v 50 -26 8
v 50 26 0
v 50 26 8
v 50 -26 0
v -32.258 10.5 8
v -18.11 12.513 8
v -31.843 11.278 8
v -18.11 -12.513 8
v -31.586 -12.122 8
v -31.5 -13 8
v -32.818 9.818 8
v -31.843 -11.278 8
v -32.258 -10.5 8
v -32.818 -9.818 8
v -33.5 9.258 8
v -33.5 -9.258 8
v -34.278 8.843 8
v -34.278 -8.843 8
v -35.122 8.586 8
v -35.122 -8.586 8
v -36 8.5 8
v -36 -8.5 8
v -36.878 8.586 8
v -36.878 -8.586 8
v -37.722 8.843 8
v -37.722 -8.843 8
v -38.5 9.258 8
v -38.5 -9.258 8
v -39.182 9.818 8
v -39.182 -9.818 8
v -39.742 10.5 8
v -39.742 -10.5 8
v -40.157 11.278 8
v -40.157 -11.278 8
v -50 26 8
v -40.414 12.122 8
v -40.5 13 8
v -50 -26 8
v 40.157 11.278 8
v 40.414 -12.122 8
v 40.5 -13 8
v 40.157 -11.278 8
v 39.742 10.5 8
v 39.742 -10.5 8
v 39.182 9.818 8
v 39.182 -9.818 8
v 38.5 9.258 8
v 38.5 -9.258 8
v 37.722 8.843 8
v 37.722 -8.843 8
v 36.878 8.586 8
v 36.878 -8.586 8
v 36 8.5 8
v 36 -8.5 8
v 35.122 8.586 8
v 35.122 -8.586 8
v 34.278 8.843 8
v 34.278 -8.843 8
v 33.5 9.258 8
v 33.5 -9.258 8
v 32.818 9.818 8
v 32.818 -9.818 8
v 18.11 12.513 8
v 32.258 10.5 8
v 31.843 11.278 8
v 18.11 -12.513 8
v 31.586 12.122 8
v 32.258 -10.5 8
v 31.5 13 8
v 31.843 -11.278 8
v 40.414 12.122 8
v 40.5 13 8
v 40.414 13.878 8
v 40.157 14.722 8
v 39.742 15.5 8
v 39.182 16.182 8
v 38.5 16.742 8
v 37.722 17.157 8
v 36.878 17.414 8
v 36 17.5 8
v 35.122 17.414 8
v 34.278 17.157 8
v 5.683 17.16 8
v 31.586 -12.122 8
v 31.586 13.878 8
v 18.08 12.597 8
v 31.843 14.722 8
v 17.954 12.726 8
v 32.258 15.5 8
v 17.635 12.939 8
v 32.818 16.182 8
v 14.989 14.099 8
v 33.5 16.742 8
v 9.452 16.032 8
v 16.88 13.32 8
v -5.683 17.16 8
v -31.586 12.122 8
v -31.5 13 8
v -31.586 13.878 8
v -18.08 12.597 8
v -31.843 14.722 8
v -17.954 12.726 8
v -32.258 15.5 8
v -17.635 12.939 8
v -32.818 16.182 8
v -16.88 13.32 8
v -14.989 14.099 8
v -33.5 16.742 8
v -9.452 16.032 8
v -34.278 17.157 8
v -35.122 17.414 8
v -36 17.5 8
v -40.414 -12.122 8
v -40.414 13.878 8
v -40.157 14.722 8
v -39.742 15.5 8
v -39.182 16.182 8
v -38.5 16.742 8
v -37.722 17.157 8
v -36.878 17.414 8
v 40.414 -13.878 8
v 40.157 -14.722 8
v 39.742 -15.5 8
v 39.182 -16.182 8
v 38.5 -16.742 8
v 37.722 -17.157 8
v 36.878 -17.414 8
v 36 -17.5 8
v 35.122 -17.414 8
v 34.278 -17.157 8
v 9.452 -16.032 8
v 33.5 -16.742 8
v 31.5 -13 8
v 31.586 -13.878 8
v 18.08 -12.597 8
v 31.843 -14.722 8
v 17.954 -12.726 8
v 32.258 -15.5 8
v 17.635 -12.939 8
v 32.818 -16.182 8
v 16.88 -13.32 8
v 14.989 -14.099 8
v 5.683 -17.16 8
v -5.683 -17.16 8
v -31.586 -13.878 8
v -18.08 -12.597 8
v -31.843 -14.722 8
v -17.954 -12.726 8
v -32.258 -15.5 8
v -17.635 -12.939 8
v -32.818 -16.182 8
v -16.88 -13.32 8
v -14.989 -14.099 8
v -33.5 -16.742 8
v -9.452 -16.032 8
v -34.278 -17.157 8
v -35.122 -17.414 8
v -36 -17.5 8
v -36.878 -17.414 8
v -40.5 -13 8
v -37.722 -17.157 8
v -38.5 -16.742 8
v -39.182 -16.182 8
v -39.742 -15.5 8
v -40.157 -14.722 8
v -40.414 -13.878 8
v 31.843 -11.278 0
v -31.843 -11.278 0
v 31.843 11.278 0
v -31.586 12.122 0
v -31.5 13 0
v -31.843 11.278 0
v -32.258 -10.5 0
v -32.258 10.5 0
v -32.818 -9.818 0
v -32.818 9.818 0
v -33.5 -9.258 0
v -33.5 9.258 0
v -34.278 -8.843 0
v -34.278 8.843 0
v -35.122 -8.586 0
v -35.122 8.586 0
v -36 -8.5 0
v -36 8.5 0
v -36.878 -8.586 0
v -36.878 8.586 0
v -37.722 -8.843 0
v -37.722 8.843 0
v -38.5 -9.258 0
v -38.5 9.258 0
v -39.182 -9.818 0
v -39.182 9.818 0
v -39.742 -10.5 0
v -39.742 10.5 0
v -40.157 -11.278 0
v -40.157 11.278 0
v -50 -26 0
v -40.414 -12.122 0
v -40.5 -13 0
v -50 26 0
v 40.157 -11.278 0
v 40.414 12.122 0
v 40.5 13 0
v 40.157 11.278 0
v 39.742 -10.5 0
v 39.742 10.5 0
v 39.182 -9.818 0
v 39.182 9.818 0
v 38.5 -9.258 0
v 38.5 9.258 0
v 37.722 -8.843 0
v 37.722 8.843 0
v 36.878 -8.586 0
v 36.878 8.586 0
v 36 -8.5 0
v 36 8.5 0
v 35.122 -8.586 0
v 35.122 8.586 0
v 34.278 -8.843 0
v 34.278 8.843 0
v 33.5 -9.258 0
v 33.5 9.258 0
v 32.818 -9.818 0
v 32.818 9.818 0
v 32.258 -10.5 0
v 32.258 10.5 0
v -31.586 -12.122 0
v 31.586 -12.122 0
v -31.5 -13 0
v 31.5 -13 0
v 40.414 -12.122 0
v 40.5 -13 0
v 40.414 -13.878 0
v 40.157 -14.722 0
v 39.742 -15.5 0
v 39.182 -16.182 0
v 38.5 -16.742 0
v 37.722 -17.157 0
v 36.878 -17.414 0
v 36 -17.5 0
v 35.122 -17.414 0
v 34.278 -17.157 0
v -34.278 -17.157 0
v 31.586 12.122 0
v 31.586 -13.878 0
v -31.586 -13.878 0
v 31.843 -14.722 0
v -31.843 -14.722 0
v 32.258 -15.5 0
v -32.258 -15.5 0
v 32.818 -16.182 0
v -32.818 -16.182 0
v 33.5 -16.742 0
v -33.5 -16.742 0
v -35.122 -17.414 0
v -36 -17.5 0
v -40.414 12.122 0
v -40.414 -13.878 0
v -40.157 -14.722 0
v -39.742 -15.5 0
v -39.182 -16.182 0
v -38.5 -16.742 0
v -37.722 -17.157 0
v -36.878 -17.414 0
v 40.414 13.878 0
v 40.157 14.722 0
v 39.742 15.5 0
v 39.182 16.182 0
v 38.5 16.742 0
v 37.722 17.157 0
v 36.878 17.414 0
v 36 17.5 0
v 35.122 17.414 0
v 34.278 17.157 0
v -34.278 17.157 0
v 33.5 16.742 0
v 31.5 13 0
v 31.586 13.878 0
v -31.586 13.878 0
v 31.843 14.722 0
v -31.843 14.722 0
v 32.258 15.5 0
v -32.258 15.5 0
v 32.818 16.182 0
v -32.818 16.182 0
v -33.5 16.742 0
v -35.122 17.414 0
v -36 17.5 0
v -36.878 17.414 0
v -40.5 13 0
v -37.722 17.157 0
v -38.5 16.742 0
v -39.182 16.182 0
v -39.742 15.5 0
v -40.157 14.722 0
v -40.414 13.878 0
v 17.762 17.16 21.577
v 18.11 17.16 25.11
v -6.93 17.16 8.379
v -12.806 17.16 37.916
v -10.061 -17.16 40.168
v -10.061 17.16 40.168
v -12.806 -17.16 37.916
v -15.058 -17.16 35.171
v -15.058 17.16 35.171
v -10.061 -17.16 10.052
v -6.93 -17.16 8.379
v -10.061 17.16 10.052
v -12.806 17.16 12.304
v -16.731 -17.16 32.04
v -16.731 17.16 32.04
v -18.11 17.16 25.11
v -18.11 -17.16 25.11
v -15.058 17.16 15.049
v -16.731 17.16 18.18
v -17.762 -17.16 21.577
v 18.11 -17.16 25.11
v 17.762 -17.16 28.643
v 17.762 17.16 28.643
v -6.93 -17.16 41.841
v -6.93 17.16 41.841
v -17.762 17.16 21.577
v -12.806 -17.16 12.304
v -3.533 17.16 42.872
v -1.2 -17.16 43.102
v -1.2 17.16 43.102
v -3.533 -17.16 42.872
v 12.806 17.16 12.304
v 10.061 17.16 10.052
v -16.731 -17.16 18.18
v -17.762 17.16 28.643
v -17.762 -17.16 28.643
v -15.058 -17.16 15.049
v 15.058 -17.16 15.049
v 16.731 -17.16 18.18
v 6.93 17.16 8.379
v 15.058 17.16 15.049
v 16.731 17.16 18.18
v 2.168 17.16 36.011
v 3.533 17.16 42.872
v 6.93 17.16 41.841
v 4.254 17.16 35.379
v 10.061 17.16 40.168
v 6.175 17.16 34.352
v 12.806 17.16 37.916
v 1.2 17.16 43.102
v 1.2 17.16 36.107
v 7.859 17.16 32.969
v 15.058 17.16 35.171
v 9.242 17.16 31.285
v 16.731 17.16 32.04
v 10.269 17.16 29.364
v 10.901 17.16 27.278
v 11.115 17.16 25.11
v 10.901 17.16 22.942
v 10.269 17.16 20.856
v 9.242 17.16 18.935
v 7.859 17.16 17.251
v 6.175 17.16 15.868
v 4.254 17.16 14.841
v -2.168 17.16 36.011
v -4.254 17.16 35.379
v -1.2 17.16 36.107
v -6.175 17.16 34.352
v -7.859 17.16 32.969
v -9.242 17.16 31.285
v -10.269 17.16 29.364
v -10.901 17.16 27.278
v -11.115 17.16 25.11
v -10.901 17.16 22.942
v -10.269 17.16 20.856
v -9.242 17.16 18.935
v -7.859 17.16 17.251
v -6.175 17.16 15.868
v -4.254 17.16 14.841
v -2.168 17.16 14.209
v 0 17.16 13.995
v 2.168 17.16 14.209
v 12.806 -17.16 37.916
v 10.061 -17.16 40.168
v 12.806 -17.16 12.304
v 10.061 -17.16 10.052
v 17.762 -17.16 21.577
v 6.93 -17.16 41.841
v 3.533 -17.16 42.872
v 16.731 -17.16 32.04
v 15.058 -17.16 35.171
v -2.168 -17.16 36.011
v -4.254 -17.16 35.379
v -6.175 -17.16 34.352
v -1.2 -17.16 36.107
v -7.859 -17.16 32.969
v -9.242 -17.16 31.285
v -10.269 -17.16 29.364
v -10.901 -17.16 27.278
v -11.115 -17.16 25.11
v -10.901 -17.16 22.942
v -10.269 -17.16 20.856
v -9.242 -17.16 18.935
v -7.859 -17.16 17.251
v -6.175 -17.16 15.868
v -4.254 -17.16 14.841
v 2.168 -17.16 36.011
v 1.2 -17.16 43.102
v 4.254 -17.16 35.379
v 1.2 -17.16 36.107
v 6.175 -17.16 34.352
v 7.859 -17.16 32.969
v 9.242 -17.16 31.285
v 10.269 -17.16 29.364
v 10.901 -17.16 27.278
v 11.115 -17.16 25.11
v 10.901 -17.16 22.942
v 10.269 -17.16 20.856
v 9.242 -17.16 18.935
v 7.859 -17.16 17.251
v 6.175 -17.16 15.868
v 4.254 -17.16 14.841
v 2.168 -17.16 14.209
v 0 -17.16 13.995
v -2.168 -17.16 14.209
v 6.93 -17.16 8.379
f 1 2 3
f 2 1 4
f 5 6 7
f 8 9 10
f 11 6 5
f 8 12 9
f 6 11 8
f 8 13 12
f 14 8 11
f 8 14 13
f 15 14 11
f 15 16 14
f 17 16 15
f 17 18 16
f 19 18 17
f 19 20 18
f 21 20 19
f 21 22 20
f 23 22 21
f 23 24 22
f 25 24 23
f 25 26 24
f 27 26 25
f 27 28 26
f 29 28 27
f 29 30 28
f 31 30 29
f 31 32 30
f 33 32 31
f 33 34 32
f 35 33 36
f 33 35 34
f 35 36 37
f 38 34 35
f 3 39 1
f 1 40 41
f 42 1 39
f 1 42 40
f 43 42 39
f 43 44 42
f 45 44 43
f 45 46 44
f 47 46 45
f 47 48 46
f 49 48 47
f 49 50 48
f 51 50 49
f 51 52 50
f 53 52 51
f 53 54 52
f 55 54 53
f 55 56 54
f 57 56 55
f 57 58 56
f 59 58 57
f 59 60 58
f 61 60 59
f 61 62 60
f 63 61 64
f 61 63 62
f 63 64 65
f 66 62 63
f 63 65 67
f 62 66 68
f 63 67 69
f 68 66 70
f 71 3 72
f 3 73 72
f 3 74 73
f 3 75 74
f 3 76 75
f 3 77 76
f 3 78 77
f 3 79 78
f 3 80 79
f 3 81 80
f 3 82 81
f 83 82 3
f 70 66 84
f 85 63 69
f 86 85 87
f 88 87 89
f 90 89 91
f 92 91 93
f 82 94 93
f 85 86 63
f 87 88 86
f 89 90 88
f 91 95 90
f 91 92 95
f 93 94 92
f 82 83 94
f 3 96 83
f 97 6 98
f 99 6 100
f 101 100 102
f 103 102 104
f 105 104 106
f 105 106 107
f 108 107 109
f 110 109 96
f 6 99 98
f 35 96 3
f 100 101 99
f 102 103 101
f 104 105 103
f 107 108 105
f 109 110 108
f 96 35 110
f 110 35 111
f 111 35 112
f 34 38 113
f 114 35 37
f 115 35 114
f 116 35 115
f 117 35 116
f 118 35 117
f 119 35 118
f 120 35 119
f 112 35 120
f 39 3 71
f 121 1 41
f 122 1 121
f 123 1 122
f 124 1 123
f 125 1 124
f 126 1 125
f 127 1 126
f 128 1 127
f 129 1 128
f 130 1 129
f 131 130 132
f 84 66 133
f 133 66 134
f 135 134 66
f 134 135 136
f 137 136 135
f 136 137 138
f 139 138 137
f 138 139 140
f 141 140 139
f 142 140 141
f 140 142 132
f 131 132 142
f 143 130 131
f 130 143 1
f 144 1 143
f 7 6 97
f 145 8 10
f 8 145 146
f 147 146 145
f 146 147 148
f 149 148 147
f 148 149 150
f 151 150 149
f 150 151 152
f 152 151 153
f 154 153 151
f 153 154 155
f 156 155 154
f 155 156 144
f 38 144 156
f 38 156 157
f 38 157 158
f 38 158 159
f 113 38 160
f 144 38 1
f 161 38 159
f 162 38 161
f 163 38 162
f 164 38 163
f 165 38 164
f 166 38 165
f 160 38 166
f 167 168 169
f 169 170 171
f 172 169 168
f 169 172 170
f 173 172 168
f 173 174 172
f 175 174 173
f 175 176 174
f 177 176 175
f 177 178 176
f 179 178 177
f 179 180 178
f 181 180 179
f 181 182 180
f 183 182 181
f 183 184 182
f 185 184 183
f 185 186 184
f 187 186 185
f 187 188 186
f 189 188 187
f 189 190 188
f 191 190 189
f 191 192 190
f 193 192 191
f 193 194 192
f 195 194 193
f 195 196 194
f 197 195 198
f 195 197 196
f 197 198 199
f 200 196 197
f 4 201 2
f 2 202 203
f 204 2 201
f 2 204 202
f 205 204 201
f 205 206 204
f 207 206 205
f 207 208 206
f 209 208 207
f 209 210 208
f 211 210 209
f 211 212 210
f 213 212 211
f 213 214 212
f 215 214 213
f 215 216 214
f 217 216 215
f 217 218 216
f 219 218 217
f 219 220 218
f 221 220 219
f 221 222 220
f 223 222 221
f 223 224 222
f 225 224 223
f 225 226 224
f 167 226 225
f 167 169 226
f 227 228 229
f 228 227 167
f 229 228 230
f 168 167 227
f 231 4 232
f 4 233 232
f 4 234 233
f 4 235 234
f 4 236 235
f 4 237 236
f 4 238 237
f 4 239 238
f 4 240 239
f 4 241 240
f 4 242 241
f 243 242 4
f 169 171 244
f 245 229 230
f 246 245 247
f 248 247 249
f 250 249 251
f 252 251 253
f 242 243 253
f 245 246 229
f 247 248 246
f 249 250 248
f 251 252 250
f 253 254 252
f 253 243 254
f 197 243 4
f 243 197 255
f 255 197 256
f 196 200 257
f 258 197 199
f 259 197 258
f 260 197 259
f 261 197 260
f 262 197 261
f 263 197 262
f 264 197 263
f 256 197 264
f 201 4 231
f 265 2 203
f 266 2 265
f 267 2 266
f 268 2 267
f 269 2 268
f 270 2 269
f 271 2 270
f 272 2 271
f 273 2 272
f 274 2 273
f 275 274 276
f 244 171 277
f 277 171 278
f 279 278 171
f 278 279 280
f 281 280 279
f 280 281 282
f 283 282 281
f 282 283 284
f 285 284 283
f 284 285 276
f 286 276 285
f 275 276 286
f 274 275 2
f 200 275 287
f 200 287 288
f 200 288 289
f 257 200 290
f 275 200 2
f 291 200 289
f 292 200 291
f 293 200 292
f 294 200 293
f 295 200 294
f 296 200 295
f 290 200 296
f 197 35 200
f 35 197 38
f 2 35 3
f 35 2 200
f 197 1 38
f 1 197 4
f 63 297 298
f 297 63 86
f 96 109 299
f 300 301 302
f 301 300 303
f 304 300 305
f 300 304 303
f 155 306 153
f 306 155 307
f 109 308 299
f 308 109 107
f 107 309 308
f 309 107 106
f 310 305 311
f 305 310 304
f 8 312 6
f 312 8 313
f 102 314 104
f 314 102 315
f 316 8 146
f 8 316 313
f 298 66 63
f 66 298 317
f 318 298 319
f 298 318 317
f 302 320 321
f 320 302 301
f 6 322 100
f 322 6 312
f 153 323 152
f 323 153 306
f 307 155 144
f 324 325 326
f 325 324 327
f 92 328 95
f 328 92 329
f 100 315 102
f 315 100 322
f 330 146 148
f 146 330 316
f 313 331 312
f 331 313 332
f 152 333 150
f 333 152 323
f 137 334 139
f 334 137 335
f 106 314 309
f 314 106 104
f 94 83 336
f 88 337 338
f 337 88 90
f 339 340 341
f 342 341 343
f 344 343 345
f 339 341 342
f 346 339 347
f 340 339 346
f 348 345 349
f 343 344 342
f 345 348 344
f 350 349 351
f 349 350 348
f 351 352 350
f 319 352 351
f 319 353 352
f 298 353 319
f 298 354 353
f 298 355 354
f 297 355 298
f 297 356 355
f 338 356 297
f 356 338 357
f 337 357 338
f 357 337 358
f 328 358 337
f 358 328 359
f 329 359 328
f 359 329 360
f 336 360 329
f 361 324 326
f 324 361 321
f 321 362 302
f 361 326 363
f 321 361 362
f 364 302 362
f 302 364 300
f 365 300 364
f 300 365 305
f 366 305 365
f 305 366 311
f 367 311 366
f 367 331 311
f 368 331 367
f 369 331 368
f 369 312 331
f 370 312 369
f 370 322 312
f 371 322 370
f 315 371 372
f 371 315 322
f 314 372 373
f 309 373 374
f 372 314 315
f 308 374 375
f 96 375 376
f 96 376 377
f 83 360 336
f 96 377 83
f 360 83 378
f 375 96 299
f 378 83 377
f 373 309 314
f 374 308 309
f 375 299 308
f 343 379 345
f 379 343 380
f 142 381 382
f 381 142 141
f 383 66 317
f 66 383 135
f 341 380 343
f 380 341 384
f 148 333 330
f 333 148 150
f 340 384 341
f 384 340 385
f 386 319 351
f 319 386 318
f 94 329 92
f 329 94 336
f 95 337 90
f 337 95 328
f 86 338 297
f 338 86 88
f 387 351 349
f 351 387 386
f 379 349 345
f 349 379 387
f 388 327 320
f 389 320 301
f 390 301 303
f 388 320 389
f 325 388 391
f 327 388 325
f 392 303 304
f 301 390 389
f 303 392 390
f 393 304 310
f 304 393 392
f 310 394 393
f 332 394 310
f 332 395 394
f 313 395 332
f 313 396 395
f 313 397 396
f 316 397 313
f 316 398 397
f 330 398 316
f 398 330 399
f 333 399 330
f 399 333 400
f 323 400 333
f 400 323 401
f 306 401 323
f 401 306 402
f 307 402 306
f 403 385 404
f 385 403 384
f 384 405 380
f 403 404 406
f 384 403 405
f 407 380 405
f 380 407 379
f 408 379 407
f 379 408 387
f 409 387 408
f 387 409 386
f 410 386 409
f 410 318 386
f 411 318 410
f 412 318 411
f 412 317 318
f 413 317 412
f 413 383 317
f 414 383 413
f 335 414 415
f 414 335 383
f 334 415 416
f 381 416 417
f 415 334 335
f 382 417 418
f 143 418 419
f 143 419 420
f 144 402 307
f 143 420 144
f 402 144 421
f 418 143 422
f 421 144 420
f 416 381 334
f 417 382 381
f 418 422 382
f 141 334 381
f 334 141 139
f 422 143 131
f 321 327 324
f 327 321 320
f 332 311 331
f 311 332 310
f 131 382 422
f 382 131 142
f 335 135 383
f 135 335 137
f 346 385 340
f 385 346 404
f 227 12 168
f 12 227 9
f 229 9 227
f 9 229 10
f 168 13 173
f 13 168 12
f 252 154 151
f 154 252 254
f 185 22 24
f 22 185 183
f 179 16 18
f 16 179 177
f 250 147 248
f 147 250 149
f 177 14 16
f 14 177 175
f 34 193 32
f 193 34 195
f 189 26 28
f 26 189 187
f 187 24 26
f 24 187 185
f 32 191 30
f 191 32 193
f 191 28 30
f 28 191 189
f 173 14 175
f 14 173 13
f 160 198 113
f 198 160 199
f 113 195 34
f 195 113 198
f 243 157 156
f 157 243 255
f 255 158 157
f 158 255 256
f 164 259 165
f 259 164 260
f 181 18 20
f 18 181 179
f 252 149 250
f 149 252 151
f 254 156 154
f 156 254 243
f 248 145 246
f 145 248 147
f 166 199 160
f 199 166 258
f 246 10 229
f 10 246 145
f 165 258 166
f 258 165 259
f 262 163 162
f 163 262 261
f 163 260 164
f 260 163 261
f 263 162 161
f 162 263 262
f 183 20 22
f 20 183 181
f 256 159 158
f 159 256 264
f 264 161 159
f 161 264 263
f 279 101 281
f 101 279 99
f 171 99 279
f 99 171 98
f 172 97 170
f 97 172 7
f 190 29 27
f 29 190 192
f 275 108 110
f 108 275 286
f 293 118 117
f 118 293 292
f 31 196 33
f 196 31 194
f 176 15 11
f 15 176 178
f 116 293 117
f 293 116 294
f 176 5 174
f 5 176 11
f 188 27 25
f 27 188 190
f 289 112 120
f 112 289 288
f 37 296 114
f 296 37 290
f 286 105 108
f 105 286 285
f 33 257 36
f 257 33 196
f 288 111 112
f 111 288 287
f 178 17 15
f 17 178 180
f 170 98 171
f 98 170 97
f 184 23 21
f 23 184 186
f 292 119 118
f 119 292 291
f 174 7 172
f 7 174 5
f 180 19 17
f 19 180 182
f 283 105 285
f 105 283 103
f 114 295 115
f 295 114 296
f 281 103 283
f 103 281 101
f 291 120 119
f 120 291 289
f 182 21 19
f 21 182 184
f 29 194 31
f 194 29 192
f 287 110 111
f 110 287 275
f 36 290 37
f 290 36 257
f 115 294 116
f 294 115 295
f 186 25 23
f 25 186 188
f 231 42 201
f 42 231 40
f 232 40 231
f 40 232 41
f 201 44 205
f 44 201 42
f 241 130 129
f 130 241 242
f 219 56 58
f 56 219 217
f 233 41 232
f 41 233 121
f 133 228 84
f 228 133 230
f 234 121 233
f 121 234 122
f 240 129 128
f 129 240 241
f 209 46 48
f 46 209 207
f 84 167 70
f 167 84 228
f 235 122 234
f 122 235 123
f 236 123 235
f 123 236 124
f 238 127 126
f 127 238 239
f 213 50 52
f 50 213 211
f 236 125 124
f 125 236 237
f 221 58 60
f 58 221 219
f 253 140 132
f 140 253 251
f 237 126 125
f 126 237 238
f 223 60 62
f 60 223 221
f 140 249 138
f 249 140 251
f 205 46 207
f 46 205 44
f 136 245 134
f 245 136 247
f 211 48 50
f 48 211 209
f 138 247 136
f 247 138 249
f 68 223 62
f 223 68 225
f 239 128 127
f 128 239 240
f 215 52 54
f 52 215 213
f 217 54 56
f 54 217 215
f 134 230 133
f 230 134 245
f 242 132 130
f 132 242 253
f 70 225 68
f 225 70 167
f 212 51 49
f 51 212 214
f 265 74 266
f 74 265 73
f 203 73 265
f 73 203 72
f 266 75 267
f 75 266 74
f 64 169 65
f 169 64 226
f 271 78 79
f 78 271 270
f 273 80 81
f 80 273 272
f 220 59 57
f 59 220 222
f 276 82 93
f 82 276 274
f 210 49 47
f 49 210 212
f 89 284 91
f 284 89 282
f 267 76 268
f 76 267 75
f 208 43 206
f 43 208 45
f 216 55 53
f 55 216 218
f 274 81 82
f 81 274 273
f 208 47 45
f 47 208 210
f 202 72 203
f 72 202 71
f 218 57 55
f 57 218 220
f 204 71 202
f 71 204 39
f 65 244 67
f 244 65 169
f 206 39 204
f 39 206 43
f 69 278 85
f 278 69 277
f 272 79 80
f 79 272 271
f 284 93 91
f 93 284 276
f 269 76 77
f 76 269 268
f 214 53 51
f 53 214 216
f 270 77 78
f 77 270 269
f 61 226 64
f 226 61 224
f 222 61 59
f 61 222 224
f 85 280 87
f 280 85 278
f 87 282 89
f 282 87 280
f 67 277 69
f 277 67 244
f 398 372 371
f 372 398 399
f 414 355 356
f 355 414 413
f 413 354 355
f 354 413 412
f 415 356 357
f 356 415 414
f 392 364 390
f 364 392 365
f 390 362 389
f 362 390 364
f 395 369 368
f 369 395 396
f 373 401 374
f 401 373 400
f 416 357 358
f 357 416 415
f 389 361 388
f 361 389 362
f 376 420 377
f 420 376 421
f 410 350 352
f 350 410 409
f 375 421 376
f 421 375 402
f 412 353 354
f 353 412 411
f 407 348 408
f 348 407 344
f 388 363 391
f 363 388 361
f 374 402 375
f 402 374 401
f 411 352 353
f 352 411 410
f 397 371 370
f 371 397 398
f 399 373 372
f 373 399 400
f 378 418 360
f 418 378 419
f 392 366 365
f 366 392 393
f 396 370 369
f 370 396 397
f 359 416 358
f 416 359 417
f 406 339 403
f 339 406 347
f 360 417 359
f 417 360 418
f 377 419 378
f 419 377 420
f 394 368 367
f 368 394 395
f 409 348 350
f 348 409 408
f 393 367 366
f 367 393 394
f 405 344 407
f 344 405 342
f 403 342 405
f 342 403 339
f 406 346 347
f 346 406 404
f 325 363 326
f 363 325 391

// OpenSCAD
$fn = 32;
// ----------------------------------------------------------------------
// Bearing block: 100 x 52 mm base, 22.23 mm bore at 25.11 mm
// ----------------------------------------------------------------------

// --- parameters (mm) ---
base_w = 100;             // base width
base_d = 52;              // base depth
base_t = 8;               // base thickness
bore_d = 22.23;           // shaft / bearing bore
house_r = 18.11;          // housing outer radius
house_len = 34.32;        // housing length along the shaft
foot_w = 36.22;           // foot width under the housing
foot_len = 24.32;         // foot length along the shaft
axis_z = 25.11;           // bore axis height above the base
holes_d = 9;              // mounting holes
hole_x = 36;              // mounting hole spacing
groove_w = 2.4;           // oil groove width

difference() {
  union() {
    /* base plate with its underside on z = 0 */
    translate([0, 0, base_t / 2]) cube([base_w, base_d, base_t], center = true);
    /* hull foot: a straight web blending into the round housing */
    hull() {
      translate([0, 0, base_t - 0.5]) cube([foot_w, foot_len, 1.6], center = true);
      translate([0, 0, axis_z]) rotate([-90, 0, 0]) cylinder(h = house_len, d = 2 * house_r, center = true);
    }
  }
  /* bore through the housing, 2.5 mm clear on both sides */
  translate([0, 0, axis_z]) rotate([-90, 0, 0]) cylinder(h = house_len + 5, d = bore_d, center = true);
  /* oil groove from the top of the housing into the bore */
  translate([-groove_w / 2, -house_len / 2 - 2.5, axis_z + bore_d * 0.17]) cube([groove_w, house_len + 5, house_r + 5]);
  /* mounting holes through the base plate */
  for (hx = [-36, 36]) {
    for (hy = [-13, 13]) {
      translate([hx, hy, -2.5]) cylinder(h = base_t + 5, d = holes_d);
    }
  }
}
